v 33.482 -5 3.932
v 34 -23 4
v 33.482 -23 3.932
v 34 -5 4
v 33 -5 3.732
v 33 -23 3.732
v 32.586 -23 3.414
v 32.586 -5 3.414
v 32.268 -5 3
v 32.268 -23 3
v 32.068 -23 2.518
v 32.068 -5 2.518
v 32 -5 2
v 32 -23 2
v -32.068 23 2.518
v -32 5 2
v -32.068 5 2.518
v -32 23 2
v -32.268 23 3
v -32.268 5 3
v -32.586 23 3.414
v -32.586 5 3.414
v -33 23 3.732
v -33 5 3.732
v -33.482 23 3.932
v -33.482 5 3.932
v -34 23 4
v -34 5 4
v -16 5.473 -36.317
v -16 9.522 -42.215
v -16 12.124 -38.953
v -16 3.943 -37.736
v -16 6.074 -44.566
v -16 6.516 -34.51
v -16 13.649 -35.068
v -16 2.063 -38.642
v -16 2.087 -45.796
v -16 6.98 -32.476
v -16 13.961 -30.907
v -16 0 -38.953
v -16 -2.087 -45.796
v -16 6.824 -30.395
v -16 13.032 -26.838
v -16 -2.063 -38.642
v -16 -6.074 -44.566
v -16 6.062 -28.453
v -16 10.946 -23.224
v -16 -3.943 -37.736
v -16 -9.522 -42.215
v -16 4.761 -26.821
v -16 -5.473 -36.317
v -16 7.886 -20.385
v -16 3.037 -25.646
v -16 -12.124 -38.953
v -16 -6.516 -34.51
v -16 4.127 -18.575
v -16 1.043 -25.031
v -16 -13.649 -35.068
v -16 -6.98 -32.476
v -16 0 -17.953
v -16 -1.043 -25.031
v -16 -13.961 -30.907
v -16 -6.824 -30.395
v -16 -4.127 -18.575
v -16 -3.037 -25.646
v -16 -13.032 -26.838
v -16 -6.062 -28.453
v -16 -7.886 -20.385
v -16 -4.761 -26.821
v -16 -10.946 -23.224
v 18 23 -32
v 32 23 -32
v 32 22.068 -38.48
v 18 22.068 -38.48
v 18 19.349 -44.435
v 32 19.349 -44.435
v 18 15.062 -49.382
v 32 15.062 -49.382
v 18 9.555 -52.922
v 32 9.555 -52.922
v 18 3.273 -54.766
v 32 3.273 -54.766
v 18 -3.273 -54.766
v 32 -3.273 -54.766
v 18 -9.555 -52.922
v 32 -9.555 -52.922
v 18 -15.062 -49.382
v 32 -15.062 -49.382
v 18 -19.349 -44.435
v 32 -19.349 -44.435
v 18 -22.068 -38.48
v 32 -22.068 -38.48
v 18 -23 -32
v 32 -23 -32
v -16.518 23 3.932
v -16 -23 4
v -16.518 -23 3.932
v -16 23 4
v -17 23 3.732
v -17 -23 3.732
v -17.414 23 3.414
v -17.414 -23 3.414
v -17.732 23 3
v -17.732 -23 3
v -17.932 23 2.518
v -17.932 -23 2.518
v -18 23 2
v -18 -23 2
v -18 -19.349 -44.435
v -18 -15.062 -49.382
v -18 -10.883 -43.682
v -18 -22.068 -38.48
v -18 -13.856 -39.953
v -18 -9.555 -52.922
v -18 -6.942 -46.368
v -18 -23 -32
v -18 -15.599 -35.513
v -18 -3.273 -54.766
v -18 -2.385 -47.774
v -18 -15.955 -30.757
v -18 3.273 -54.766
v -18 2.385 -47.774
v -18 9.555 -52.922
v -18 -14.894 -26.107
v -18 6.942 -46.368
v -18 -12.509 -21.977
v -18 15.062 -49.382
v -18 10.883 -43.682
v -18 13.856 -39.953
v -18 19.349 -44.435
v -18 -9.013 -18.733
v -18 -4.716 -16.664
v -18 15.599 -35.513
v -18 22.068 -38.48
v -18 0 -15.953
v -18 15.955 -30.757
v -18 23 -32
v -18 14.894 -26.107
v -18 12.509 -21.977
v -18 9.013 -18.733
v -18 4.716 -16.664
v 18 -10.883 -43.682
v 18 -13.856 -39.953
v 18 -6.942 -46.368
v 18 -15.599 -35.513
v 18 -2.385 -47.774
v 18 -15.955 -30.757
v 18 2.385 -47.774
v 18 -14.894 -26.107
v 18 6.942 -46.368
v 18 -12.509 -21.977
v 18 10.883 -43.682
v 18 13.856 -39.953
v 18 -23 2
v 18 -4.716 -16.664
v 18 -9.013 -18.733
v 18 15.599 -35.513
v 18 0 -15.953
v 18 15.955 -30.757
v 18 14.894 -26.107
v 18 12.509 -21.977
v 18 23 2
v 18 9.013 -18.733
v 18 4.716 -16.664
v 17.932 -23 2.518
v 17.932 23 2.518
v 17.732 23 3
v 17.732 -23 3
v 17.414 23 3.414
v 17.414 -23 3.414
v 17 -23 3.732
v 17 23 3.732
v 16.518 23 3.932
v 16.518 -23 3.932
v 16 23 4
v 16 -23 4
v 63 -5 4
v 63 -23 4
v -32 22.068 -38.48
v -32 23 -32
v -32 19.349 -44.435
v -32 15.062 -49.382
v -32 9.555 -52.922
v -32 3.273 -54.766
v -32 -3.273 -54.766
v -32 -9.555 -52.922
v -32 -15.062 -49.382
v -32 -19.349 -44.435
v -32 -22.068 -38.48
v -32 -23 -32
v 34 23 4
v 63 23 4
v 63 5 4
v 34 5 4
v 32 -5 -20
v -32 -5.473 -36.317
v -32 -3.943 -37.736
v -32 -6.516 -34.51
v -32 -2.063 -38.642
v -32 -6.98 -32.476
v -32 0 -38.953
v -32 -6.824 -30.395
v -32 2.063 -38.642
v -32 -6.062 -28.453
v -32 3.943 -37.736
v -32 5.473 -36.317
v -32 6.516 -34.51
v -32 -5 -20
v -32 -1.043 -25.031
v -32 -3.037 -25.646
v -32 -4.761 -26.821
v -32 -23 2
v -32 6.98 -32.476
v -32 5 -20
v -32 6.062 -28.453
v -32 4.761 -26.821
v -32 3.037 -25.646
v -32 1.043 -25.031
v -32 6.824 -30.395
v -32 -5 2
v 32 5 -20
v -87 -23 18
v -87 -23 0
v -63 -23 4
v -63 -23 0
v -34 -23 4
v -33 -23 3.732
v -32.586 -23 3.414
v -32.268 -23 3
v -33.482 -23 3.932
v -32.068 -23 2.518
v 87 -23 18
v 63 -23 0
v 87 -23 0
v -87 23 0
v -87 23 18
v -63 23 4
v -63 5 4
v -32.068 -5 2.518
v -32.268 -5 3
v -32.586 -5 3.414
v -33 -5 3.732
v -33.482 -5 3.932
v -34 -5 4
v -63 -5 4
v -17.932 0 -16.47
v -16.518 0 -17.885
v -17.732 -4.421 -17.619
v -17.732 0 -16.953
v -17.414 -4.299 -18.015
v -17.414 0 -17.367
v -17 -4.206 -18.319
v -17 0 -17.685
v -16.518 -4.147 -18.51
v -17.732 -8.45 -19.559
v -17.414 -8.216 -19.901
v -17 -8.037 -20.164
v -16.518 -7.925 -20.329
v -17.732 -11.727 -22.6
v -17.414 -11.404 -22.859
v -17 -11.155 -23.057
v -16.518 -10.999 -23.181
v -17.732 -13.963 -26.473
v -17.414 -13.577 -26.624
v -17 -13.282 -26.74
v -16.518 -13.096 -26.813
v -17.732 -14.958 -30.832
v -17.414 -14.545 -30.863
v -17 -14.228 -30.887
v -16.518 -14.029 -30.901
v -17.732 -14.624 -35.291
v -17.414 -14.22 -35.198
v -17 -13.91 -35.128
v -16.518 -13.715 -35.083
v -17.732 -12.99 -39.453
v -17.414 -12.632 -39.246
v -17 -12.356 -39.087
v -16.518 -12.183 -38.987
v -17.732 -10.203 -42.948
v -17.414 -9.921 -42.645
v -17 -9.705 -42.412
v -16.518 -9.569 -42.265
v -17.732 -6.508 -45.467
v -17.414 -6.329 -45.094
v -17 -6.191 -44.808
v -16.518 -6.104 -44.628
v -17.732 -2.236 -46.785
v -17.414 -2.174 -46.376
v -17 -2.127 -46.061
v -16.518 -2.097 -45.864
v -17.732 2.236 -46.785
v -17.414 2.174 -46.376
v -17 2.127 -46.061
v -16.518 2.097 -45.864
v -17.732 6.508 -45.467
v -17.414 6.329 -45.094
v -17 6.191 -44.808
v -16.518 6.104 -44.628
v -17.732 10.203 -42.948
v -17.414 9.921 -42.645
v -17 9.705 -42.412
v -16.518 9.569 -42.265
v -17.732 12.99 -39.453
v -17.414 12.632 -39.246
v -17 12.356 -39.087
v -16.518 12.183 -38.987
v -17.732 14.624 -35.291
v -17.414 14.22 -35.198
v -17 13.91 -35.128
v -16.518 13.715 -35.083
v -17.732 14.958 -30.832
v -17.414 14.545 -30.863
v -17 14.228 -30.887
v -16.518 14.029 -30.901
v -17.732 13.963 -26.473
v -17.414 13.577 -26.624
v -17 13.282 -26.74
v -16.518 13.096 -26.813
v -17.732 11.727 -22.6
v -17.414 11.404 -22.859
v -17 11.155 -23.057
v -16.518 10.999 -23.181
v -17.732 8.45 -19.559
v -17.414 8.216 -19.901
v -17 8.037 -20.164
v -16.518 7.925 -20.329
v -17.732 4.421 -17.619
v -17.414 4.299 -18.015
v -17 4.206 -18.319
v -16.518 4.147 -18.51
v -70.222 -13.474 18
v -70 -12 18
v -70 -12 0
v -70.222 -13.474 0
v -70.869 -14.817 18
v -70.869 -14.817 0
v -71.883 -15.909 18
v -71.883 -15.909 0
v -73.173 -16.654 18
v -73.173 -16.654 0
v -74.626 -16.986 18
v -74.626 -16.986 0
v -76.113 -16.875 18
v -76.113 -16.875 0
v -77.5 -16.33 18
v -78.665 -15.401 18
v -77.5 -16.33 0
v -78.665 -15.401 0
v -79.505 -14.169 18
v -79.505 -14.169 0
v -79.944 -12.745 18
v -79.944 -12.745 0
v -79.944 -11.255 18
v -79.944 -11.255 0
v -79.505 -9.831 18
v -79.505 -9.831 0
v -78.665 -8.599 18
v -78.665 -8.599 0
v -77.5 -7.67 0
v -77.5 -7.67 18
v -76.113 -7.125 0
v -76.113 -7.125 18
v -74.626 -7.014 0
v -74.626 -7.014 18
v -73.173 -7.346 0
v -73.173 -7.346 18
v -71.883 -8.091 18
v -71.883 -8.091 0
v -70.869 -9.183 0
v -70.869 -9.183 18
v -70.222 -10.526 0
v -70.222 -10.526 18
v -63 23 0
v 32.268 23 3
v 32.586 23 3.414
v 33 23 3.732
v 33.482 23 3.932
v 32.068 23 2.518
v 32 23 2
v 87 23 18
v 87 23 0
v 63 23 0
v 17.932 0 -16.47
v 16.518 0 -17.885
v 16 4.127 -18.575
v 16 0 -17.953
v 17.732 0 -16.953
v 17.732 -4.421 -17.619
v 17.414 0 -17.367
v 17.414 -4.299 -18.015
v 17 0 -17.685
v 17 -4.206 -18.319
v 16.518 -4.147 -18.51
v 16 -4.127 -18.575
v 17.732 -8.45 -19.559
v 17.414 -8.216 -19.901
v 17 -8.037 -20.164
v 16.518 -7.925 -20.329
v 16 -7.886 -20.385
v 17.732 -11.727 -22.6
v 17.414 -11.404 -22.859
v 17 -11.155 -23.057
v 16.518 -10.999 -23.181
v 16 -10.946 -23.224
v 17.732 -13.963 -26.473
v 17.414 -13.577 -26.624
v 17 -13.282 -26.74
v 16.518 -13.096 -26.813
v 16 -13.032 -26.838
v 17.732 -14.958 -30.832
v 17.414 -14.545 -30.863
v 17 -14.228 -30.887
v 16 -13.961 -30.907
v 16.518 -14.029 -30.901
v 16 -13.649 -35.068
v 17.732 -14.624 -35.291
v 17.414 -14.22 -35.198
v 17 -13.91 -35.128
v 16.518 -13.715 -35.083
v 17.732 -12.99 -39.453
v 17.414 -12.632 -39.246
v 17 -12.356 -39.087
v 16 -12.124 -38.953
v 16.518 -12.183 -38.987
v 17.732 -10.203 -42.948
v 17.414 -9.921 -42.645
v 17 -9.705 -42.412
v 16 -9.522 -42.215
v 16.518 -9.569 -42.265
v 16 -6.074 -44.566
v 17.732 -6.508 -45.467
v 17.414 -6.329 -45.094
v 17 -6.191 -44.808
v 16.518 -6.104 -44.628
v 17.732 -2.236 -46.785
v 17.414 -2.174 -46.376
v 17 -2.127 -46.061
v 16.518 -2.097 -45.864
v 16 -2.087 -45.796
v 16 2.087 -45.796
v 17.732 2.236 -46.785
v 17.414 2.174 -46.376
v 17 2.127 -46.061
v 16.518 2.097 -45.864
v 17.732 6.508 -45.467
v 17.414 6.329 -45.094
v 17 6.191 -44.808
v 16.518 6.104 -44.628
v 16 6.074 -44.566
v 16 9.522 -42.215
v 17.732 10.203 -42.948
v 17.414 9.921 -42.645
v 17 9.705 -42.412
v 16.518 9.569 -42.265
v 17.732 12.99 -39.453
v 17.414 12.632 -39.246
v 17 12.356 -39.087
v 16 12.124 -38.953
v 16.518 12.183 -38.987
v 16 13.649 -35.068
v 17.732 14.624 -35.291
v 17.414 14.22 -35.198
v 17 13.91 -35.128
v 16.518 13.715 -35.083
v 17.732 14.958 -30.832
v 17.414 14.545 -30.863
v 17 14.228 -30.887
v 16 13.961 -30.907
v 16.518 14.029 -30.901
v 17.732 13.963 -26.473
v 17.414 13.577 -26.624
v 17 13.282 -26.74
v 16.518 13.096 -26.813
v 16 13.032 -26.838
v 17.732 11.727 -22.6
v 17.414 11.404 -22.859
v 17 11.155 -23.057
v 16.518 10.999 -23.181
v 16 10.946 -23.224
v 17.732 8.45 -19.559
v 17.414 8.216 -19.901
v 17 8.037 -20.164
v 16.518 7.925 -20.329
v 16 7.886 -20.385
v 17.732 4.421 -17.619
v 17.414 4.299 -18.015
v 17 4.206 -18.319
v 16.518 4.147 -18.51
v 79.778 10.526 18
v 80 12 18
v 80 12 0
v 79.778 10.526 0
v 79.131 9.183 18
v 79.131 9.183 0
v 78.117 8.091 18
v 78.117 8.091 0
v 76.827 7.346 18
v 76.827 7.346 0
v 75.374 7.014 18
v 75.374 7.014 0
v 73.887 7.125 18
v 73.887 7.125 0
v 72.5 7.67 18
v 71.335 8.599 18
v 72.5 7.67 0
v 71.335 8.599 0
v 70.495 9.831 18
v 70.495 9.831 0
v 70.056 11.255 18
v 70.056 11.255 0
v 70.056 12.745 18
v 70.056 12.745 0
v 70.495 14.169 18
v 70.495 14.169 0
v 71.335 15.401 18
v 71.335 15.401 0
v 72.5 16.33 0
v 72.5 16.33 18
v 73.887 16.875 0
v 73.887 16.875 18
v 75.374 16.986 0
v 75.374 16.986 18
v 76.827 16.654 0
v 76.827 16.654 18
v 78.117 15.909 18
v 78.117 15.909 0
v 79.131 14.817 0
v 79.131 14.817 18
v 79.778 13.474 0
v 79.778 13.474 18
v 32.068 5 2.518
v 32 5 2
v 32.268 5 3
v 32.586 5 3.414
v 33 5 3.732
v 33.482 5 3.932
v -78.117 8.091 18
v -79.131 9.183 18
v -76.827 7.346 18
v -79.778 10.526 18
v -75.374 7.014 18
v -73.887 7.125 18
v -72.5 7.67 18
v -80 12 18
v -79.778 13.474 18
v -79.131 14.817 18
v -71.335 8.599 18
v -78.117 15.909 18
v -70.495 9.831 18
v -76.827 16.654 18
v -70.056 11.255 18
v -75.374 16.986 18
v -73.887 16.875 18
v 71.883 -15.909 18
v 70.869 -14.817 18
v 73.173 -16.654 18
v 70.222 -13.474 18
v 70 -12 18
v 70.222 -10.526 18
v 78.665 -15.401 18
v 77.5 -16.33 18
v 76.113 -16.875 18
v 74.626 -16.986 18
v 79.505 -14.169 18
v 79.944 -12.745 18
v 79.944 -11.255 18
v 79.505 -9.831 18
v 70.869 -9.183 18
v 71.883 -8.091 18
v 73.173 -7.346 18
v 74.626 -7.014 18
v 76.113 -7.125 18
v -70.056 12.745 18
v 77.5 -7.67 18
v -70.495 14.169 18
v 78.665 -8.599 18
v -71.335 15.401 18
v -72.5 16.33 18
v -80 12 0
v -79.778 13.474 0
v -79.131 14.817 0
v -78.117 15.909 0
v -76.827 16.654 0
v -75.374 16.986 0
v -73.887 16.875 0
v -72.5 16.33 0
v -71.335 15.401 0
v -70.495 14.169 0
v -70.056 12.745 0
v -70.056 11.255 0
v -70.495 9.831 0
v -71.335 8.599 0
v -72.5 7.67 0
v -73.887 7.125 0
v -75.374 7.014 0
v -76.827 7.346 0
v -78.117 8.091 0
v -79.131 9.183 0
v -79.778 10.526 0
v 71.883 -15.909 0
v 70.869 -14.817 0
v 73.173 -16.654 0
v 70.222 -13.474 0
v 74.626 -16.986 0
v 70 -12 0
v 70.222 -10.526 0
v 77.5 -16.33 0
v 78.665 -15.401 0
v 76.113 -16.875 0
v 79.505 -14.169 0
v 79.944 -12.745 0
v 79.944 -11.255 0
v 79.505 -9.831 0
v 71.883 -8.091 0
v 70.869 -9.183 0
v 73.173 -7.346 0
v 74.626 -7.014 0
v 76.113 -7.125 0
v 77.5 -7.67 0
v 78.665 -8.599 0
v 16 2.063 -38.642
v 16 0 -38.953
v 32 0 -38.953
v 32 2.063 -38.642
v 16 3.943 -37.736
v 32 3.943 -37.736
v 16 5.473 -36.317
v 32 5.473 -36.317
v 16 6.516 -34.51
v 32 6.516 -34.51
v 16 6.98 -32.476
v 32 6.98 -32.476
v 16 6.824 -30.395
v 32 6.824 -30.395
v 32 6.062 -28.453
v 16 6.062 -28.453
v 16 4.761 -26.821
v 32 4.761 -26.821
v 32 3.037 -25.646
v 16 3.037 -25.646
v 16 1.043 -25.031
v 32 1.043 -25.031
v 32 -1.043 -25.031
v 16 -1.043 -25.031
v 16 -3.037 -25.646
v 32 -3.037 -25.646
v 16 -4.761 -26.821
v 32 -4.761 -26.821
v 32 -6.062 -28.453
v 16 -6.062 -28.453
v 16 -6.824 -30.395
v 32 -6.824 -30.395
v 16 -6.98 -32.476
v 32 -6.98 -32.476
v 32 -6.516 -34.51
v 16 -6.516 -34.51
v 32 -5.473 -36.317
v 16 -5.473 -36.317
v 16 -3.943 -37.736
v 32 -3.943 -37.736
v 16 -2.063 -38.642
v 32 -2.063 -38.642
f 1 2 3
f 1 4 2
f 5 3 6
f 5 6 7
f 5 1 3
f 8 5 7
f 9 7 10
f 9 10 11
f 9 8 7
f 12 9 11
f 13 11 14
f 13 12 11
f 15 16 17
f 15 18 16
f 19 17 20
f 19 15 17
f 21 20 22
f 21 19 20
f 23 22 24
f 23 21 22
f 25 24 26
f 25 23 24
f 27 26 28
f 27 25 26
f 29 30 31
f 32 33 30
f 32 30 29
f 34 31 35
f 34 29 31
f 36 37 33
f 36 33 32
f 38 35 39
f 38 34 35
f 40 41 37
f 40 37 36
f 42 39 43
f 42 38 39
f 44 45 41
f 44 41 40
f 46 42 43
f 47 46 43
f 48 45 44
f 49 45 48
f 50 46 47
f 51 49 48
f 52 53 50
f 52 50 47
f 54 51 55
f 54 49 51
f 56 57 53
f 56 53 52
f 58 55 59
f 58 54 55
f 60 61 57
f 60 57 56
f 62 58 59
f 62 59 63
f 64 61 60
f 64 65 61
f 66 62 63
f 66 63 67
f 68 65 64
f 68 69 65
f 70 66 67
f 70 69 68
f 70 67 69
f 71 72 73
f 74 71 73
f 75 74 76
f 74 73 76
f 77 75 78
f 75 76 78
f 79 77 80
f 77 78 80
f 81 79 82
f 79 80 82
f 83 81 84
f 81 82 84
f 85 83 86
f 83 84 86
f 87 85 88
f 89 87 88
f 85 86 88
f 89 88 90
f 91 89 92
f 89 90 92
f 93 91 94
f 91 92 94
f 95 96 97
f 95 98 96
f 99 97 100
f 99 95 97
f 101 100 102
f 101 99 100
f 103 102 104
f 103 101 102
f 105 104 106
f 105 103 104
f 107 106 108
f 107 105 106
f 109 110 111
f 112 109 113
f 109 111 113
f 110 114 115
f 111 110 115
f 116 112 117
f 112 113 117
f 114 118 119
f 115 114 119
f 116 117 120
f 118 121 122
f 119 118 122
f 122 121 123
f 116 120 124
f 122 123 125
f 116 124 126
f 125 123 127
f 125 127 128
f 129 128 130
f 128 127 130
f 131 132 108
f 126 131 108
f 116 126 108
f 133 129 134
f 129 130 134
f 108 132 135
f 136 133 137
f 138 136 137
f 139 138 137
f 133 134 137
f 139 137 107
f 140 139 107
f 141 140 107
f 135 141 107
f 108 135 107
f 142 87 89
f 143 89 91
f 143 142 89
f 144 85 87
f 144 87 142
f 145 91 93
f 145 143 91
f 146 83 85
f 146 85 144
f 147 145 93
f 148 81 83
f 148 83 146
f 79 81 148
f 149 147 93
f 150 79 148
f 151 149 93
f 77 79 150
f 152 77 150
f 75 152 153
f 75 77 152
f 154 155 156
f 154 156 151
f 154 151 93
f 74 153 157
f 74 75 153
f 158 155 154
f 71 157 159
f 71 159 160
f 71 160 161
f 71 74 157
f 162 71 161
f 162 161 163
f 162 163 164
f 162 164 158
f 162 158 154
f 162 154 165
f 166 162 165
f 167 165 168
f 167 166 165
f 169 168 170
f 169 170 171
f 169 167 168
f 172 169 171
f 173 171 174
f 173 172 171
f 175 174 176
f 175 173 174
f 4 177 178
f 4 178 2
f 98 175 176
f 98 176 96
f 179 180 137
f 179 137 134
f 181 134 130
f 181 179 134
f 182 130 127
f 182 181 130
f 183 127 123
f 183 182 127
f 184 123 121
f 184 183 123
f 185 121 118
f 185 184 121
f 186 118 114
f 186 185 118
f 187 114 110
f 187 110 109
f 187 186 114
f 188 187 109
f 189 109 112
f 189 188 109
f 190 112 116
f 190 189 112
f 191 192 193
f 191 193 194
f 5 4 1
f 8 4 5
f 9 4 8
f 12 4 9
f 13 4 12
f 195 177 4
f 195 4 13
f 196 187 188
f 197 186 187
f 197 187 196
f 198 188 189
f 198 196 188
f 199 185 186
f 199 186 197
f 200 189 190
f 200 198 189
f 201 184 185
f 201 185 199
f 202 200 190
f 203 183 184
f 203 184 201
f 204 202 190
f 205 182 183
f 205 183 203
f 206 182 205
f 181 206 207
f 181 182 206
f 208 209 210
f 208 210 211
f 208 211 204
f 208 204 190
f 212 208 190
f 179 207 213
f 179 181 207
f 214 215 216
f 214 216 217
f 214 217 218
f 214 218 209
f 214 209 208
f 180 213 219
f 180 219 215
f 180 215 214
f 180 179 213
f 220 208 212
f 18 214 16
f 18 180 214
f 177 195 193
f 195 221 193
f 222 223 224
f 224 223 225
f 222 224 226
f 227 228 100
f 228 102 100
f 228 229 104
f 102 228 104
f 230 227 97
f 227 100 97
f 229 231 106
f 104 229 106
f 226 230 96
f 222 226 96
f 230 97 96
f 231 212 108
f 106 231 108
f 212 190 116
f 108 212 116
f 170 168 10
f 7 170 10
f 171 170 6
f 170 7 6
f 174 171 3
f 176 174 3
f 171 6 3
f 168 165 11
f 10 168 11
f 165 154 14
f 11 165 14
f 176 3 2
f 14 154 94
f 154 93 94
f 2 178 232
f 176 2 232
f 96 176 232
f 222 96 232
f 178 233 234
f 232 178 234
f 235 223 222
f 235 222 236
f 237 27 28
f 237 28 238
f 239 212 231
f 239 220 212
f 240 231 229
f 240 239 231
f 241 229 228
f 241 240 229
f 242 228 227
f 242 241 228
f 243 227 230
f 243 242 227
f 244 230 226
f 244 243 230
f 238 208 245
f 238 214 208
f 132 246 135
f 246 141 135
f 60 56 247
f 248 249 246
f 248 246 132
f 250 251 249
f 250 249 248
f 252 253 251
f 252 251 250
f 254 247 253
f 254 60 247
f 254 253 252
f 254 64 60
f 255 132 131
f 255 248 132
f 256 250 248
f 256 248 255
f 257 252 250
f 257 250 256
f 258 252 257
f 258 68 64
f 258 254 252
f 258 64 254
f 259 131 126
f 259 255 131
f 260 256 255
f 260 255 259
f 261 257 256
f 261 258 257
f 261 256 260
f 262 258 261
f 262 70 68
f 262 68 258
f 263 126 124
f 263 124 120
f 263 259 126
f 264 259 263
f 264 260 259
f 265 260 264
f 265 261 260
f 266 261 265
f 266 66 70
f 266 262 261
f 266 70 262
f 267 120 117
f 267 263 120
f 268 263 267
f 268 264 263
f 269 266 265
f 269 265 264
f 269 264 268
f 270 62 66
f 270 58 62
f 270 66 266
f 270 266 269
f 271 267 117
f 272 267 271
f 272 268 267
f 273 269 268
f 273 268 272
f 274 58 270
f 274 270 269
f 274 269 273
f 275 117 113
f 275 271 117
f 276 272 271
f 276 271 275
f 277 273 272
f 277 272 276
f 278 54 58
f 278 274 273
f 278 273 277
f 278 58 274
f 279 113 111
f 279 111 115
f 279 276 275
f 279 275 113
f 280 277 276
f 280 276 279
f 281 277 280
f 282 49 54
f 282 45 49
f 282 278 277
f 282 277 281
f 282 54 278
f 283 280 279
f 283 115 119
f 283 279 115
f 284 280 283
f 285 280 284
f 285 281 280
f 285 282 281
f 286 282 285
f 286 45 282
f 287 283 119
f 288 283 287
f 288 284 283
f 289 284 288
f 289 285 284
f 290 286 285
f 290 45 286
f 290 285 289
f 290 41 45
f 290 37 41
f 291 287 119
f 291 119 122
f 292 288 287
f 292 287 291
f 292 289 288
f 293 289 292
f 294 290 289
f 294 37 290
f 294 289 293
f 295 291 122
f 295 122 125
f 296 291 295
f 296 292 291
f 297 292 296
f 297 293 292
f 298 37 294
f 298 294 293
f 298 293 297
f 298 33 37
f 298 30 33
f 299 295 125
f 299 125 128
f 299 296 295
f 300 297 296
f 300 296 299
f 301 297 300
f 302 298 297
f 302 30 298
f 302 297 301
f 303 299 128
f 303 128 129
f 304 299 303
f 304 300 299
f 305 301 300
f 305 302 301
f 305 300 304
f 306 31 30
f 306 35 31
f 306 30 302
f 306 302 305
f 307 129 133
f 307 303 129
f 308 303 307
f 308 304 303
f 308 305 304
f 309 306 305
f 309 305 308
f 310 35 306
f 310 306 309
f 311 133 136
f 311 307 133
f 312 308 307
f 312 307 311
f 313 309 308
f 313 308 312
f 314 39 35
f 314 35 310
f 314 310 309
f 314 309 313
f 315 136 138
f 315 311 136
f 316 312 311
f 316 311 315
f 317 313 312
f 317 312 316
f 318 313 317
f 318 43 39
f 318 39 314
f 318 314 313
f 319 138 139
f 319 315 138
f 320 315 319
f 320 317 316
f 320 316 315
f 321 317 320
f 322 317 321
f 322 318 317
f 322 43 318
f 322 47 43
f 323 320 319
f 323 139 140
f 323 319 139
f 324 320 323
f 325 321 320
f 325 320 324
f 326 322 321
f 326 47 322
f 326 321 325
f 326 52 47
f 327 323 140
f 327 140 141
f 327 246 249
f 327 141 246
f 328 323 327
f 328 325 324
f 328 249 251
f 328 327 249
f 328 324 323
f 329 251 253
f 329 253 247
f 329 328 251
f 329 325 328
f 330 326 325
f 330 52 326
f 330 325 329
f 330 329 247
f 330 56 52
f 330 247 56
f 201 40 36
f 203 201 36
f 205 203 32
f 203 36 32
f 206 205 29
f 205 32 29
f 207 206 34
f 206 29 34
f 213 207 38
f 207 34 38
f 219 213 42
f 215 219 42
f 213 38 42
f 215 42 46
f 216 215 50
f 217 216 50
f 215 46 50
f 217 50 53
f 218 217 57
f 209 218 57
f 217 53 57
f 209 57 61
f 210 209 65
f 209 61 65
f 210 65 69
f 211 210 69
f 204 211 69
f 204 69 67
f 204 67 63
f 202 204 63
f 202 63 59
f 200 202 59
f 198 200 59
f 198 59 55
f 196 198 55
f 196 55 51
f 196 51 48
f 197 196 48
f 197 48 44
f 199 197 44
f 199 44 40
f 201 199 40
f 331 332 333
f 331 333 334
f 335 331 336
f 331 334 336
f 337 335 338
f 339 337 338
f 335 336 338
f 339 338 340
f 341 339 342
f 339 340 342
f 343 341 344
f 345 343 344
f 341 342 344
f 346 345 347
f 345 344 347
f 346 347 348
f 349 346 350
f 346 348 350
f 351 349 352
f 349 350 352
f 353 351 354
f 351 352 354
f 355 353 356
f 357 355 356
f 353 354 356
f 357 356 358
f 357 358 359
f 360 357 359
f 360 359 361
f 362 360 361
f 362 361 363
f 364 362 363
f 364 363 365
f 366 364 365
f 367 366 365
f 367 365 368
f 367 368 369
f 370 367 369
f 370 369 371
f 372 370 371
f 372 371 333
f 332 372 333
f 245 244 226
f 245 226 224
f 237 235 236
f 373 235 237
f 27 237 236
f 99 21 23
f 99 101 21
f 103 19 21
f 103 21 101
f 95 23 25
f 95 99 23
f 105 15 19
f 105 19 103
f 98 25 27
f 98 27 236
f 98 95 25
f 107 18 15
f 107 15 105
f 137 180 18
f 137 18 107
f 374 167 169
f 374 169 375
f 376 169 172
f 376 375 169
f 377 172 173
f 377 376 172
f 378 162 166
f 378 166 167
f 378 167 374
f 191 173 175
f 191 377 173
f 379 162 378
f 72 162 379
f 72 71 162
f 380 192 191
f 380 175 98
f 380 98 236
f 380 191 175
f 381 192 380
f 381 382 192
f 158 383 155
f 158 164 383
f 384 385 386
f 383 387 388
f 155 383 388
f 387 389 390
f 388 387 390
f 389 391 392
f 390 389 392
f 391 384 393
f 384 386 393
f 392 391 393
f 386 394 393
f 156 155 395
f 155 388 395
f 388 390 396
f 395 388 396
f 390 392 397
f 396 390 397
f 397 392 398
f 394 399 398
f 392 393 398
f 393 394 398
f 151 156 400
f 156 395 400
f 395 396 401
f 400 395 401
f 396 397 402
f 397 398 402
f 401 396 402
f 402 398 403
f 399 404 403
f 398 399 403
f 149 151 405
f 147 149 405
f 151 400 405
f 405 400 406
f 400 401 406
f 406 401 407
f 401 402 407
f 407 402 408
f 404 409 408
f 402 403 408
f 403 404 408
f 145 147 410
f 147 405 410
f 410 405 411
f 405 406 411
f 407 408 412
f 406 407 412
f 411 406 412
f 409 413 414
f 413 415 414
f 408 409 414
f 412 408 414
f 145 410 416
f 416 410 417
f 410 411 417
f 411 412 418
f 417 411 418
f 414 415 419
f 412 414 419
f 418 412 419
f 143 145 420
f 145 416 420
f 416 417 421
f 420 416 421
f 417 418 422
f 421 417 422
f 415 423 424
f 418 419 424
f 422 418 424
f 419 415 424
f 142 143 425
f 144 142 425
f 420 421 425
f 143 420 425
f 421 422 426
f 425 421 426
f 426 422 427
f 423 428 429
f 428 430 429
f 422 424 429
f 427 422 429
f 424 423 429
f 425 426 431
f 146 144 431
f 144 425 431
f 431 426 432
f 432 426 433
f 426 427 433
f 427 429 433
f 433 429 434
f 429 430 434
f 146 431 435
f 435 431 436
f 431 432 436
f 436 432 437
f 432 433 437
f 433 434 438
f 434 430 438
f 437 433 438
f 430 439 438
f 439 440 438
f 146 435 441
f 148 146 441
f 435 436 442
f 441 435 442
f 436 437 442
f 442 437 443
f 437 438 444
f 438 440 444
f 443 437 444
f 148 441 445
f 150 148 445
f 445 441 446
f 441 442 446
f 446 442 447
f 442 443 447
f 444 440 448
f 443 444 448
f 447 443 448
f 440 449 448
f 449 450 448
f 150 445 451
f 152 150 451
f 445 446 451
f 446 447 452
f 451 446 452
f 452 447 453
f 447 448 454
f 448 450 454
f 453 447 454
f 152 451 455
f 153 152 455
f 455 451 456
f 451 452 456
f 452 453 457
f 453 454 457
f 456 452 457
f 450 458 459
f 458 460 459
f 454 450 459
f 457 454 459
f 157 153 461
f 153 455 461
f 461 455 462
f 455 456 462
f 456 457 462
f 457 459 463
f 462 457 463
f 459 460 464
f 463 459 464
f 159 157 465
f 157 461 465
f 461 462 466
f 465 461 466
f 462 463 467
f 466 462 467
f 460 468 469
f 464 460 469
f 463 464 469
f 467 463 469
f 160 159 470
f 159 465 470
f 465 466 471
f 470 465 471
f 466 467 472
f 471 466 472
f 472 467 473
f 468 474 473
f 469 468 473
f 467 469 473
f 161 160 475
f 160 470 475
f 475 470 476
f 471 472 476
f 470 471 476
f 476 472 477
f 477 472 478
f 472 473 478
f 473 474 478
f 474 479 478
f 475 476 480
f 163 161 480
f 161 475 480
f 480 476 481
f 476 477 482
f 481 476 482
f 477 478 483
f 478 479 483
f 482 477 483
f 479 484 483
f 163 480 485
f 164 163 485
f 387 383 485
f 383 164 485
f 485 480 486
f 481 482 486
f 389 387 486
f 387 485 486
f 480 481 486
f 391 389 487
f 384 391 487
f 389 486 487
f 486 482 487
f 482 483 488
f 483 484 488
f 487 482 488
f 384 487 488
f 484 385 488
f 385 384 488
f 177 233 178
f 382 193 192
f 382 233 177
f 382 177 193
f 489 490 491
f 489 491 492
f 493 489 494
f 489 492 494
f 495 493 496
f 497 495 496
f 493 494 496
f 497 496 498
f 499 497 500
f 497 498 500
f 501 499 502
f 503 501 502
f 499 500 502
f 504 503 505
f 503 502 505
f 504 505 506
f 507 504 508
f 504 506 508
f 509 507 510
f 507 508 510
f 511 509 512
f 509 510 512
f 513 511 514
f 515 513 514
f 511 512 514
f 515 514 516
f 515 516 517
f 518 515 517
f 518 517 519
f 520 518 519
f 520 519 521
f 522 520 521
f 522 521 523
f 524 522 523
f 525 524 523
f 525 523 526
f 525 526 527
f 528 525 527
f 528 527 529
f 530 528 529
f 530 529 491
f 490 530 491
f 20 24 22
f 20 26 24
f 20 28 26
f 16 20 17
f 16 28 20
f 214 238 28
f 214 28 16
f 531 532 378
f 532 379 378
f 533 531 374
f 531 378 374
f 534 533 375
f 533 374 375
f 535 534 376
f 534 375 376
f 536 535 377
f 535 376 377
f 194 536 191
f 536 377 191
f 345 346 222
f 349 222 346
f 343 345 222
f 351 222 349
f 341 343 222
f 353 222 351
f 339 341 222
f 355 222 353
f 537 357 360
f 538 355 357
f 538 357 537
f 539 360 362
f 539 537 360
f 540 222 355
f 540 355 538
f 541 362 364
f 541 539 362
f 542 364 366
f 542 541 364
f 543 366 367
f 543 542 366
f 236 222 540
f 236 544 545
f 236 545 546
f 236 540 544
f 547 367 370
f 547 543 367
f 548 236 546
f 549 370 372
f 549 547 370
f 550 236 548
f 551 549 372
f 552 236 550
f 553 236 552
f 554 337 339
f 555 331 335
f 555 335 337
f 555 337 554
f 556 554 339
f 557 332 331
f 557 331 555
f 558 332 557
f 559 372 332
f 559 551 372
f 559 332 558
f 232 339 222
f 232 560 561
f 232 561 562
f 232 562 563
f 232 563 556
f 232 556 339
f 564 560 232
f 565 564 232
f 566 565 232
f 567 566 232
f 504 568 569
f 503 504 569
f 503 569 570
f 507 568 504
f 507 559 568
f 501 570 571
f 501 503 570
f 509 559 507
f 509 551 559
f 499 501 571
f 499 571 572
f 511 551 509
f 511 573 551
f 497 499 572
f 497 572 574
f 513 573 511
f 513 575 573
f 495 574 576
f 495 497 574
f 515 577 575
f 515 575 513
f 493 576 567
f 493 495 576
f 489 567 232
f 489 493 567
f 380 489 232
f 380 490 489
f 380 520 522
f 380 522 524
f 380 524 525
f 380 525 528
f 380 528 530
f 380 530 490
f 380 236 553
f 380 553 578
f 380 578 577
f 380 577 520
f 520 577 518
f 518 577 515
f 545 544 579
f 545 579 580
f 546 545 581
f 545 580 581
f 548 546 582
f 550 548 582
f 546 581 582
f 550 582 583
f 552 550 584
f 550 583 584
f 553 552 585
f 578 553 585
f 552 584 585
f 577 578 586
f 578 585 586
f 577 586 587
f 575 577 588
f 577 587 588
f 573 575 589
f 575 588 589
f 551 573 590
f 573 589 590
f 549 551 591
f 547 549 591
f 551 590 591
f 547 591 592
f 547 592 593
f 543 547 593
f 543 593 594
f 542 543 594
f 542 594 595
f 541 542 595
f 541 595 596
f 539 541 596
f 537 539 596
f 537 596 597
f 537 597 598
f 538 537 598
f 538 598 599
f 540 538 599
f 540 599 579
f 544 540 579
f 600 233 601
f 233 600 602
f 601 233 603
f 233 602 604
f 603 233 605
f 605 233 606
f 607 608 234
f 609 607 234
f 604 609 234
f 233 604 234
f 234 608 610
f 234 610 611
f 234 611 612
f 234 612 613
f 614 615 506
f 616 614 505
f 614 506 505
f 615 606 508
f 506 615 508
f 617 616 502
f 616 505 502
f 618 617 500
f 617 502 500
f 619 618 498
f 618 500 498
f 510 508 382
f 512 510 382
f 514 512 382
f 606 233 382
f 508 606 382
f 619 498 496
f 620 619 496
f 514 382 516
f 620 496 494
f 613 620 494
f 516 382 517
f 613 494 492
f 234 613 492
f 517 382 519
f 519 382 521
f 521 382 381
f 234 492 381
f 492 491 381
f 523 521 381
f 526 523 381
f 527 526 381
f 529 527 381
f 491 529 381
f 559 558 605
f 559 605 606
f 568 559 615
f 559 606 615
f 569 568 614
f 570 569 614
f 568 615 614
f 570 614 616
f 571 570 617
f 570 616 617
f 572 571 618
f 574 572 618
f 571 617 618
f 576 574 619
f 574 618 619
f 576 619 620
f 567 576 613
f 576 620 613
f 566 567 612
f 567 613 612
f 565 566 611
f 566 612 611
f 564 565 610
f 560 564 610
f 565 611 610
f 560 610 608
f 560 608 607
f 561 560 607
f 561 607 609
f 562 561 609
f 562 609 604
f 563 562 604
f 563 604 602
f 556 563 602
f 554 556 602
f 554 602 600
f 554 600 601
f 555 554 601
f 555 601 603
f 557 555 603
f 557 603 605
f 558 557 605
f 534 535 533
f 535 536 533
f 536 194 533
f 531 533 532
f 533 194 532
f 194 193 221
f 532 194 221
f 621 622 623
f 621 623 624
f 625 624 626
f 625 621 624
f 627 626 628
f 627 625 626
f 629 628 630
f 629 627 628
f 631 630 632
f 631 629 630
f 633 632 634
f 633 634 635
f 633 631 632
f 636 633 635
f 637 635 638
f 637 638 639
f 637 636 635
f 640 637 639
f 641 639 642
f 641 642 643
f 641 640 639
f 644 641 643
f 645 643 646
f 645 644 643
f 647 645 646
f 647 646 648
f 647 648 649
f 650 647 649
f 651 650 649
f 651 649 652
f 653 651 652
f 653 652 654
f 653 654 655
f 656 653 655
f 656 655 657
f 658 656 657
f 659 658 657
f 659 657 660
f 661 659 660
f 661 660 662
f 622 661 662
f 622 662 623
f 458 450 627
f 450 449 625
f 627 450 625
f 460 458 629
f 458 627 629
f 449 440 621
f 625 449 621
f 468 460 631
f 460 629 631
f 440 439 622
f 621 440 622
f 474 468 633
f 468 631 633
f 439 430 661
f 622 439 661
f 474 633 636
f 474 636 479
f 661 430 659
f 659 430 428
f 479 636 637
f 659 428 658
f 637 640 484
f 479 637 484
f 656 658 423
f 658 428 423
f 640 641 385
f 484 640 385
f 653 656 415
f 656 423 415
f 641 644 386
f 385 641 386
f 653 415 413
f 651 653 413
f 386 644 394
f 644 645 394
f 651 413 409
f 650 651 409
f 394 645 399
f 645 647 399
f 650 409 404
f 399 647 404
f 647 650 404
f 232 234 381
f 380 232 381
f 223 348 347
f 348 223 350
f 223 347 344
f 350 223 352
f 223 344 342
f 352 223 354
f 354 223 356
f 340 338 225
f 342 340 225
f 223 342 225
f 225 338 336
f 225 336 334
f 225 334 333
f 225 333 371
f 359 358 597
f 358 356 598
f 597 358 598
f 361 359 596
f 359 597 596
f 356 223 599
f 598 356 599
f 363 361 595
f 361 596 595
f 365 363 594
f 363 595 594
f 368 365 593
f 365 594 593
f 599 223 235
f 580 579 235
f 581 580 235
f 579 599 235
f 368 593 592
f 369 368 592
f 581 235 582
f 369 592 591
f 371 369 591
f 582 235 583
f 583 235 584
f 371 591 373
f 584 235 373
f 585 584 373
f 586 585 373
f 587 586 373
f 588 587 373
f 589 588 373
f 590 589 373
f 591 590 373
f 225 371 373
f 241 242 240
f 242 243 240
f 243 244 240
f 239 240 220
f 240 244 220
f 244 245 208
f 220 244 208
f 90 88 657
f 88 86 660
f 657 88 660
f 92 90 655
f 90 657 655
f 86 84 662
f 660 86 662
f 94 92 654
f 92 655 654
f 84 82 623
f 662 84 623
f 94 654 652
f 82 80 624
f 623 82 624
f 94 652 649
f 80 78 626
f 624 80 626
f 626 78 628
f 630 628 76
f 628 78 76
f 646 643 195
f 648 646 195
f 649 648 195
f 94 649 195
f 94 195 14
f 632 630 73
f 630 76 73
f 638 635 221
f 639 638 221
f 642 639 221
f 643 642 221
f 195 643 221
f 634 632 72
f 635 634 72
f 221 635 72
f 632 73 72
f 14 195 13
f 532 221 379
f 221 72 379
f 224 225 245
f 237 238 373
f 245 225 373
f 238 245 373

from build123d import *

# Parameters (mm, degrees)
SKETCH1_W           = 174
SKETCH1_H           = 46
BOSS_EXTRUDE1_DEPTH = 18
SKETCH2_W           = 126
SKETCH2_H           = 46
CUT_EXTRUDE1_DEPTH  = 4
SKETCH3_R           = 5
CUT_EXTRUDE2_DEPTH  = 92.771455257
BOSS_EXTRUDE3_DEPTH = 14
SKETCH6_R           = 14
BOSS_EXTRUDE5_DEPTH = 2
CUT_EXTRUDE3_REACH  = 121.008
SKETCH7_R           = 7
BOSS_EXTRUDE7_DEPTH = 5
FILLET1_R           = 2
FILLET2_R           = 2


with BuildPart() as part:
    # Sketch1 → Boss-Extrude1 (new body)
    with BuildSketch(Plane.XY):
        Rectangle(SKETCH1_W, SKETCH1_H)
    extrude(amount=BOSS_EXTRUDE1_DEPTH)

    # Sketch2 → Cut-Extrude1 (cut)
    with BuildSketch(Plane(origin=(0, 0, 0), x_dir=(-1, 0, 0), z_dir=(0, 0, -1))):
        Rectangle(SKETCH2_W, SKETCH2_H)
    extrude(amount=-CUT_EXTRUDE1_DEPTH, mode=Mode.SUBTRACT)

    # Sketch3 → Cut-Extrude2 (cut, through all)
    with BuildSketch(Plane(origin=(0, 0, 0), x_dir=(-1, 0, 0), z_dir=(0, 0, -1))):
        with Locations((75, 12)):
            Circle(SKETCH3_R)
        with Locations(Location((75, -12, 0), (0, 0, 180))):
            Circle(SKETCH3_R)
        with Locations((-75, -12)):
            Circle(SKETCH3_R)
        with Locations(Location((-75, 12, 0), (0, 0, 180))):
            Circle(SKETCH3_R)
    extrude(amount=-CUT_EXTRUDE2_DEPTH, mode=Mode.SUBTRACT)

    # Sketch4 → Boss-Extrude3 (add)
    with BuildSketch(Plane.ZY.offset(32)):
        with BuildLine():
            Line((4, 23), (-32, 23))
            ThreePointArc((-32, 23), (-55, 0), (-32, -23))
            Line((-32, -23), (4, -23))
            Line((4, -23), (4, 23))
        make_face()
    boss_extrude3 = extrude(amount=-BOSS_EXTRUDE3_DEPTH)

    # Sketch6 → Boss-Extrude5 (add)
    with BuildSketch(Plane(origin=(-18, 0, 0), x_dir=(0, 0, -1), z_dir=(1, 0, 0))):
        with Locations(Location((31.952757206, 0, 0), (0, 0, 180))):
            Circle(SKETCH6_R)
    boss_extrude5 = extrude(amount=BOSS_EXTRUDE5_DEPTH)

    # Sketch7 → Cut-Extrude3 (cut, up to next)
    with BuildSketch(Plane(origin=(-16, 0, 0), x_dir=(0, 0, -1), z_dir=(1, 0, 0)), mode=Mode.PRIVATE) as cut_extrude3_sk1:
        with Locations((31.952757206, 0)):
            Circle(SKETCH7_R)
    cut_extrude3_tool1 = extrude(cut_extrude3_sk1.sketch, amount=-CUT_EXTRUDE3_REACH, mode=Mode.PRIVATE) & part.part
    cut_extrude3 = cut_extrude3_tool1.solids().sort_by_distance((-16, 0, -31.952757))[0]
    add(cut_extrude3, mode=Mode.SUBTRACT)

    # Sketch9 → Boss-Extrude7 (add, symmetric)
    with BuildSketch(Plane(origin=(0, 0, 0), x_dir=(1, 0, 0), z_dir=(0, 1, 0))):
        Polygon((-32, 20), (-63, -4), (-32, -4), align=None)
    boss_extrude7 = extrude(amount=BOSS_EXTRUDE7_DEPTH, both=True)

    # Mirror1: Boss-Extrude3, Boss-Extrude5, Cut-Extrude3, Boss-Extrude7 across plane
    add(boss_extrude3.mirror(Plane(origin=(0, 0, 0), x_dir=(0, 0, 1), z_dir=(1, 0, 0))))
    add(boss_extrude5.mirror(Plane(origin=(0, 0, 0), x_dir=(0, 0, 1), z_dir=(1, 0, 0))))
    add(cut_extrude3.mirror(Plane(origin=(0, 0, 0), x_dir=(0, 0, 1), z_dir=(1, 0, 0))), mode=Mode.SUBTRACT)
    add(boss_extrude7.mirror(Plane(origin=(0, 0, 0), x_dir=(0, 0, 1), z_dir=(1, 0, 0))))

    # Fillet1
    fillet1_edges = [part.edges().sort_by_distance(p)[0] for p in [
        (32, 14, 4),
        (-18, 0, 4),
        (-32, -14, 4),
        (-32, 14, 4),
        (32, -14, 4),
        (18, 0, 4),
    ]]
    fillet(fillet1_edges, radius=FILLET1_R)

    # Fillet2
    fillet2_edges = [part.edges().sort_by_distance(p)[0] for p in [
        (-18, 0, -45.952757206),
        (18, 0, -45.952757206),
    ]]
    fillet(fillet2_edges, radius=FILLET2_R - 0.0001)  # a hair under: the kernel refuses the full size


solid = part.part
